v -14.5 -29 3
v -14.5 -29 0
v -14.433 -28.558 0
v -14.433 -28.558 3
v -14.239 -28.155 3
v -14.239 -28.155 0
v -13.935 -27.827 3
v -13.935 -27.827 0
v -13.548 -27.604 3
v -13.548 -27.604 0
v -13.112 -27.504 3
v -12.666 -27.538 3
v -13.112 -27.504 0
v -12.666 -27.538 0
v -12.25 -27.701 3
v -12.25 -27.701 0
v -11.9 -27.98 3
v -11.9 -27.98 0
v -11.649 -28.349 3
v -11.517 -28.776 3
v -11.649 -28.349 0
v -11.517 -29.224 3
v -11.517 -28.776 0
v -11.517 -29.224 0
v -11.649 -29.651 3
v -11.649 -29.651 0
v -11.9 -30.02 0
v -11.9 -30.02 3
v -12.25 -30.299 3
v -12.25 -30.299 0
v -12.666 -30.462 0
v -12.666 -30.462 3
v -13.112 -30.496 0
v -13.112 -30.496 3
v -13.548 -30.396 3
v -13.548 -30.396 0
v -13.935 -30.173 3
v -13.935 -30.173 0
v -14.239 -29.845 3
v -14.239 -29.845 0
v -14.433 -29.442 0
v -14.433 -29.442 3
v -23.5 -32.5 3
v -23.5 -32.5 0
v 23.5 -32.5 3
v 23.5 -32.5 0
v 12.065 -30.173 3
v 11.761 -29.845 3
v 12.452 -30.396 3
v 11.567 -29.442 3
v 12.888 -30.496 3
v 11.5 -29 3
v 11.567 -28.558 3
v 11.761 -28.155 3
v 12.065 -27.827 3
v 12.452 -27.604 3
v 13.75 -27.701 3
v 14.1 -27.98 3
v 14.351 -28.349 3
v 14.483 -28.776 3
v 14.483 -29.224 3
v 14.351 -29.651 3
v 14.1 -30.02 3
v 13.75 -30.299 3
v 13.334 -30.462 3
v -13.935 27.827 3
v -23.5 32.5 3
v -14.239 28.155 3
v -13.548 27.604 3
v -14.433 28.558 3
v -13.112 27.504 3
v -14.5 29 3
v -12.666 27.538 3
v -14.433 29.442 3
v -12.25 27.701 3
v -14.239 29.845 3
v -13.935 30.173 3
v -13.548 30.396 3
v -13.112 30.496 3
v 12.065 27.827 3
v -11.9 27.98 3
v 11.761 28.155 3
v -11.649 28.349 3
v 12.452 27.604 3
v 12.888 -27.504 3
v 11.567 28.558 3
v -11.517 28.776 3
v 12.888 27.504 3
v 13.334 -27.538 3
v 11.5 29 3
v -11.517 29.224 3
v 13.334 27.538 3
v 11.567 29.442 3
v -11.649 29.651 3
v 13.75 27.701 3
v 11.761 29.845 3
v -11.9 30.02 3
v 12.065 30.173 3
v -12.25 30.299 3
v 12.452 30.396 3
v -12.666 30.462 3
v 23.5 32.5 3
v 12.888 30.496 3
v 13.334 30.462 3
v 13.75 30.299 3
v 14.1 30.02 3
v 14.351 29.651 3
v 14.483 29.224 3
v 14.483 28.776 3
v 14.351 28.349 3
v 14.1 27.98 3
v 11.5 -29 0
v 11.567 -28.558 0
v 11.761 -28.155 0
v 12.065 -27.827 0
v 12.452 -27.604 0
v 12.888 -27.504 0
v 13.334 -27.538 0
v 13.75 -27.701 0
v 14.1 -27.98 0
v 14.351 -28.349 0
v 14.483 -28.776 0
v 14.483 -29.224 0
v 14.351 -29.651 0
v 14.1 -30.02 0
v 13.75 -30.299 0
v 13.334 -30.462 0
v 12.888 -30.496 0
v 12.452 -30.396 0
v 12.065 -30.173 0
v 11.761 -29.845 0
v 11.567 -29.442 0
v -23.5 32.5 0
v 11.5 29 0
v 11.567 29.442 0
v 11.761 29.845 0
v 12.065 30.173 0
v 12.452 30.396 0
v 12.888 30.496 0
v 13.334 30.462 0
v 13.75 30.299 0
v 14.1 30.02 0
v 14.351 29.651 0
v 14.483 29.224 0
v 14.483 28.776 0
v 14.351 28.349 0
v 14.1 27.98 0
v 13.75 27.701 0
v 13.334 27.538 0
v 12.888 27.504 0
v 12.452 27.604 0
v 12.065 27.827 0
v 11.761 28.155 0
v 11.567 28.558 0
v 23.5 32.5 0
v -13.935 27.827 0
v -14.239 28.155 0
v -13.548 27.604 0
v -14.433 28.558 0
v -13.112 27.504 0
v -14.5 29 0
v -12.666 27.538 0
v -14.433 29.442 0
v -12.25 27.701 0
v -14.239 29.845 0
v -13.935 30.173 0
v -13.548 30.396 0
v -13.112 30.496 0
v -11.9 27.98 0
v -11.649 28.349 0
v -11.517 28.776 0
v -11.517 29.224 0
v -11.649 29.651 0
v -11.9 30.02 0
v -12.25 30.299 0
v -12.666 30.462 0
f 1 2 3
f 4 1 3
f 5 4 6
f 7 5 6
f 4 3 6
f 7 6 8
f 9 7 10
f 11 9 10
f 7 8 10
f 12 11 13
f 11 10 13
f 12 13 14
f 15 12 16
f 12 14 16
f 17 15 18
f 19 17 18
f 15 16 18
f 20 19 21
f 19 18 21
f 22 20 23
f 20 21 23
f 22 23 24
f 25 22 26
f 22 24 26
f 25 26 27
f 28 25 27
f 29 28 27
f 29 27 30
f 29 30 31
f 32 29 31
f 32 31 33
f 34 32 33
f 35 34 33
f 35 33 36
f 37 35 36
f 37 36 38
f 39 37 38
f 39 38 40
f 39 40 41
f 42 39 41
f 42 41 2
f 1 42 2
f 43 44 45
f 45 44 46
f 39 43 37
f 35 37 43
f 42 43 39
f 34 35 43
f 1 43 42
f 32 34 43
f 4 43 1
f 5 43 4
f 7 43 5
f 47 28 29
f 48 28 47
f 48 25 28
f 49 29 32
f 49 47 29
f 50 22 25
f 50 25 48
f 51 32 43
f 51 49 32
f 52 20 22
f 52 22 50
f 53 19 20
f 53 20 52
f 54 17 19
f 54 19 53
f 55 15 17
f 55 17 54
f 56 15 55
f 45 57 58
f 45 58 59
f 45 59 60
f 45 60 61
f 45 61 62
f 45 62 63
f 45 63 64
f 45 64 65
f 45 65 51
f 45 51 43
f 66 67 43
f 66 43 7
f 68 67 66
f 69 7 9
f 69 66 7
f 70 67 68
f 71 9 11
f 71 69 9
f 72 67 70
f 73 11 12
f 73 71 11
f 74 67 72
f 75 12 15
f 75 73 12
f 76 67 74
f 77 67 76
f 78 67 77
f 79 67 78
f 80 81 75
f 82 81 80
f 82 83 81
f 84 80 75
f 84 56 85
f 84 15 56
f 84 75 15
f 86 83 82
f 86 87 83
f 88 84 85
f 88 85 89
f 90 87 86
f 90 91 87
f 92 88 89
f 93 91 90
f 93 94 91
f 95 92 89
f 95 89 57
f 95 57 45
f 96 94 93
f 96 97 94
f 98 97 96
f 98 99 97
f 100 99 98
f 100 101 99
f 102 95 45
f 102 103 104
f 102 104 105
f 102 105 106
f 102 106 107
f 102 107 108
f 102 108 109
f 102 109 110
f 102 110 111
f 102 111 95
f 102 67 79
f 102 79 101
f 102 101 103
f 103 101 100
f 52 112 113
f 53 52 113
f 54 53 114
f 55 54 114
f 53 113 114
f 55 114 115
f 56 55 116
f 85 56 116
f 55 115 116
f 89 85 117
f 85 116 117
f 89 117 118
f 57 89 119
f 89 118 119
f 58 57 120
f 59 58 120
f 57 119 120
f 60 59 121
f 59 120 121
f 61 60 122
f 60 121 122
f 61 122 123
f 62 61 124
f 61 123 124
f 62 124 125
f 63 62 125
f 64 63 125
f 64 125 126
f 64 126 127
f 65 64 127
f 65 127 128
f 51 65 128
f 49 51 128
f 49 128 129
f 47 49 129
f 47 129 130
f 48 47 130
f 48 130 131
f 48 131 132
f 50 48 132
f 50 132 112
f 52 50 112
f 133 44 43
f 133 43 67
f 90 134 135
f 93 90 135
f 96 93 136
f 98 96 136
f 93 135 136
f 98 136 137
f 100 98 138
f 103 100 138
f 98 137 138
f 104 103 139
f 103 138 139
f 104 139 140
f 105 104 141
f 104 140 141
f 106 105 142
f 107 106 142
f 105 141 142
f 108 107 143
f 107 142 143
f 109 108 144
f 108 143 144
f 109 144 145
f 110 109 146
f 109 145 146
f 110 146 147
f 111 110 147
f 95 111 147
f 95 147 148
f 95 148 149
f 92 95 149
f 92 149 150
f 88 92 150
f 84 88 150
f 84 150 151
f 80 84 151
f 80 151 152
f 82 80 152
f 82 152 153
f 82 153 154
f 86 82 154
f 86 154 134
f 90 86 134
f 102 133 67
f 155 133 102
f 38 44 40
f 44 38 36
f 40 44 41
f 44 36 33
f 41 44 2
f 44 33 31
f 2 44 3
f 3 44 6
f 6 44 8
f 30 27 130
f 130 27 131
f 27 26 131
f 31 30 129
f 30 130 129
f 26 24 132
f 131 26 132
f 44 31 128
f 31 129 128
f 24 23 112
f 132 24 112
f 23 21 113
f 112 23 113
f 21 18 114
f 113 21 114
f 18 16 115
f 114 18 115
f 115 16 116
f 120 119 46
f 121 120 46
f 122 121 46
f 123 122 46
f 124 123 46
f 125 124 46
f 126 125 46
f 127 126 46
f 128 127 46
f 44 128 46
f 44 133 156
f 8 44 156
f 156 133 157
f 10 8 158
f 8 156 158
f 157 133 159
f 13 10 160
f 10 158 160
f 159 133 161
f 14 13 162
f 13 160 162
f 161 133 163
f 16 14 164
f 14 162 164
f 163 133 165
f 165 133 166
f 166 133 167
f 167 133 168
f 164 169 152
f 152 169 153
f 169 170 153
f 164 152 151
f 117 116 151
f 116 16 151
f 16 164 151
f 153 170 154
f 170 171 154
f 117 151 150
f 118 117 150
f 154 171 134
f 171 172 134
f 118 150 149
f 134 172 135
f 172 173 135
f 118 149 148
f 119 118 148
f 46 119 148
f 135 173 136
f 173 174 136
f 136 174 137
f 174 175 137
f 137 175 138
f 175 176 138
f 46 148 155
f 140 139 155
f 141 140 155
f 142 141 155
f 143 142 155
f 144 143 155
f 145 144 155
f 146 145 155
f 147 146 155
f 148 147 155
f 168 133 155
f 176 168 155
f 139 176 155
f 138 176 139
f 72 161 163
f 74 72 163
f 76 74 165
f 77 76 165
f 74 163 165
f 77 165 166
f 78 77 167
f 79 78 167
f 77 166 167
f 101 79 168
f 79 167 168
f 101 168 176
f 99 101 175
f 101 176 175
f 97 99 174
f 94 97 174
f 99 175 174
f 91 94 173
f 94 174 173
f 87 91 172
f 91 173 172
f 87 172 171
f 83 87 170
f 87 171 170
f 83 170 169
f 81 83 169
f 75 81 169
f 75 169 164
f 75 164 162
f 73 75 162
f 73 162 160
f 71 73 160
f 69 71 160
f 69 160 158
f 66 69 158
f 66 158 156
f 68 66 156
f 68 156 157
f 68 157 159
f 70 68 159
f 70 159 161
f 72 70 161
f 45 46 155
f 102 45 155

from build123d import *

# Parameters (mm, degrees)
SKETCH1_W                 = 47
SKETCH1_H                 = 65
BOSS_EXTRUDE1_DEPTH       = 3
F_3_0MM_DOWEL_HOLE1_D     = 3
F_3_0MM_DOWEL_HOLE1_DEPTH = 4
F_3_0MM_DOWEL_HOLE1_TIP   = 0.901290929


with BuildPart() as part:
    # Sketch1 → Boss-Extrude1 (new body)
    with BuildSketch(Plane.XY):
        Rectangle(SKETCH1_W, SKETCH1_H)
    extrude(amount=BOSS_EXTRUDE1_DEPTH)

    # Ø3.0mm Dowel Hole1
    with Locations(Plane.XY.offset(3)):
        with Locations((-13, -29), (13, -29), (13, 29), (-13, 29)):
            Hole(F_3_0MM_DOWEL_HOLE1_D / 2, depth=F_3_0MM_DOWEL_HOLE1_DEPTH)
            with Locations((0, 0, -(F_3_0MM_DOWEL_HOLE1_DEPTH + F_3_0MM_DOWEL_HOLE1_TIP / 2))):  # 118° drill point
                Cone(0, F_3_0MM_DOWEL_HOLE1_D / 2, F_3_0MM_DOWEL_HOLE1_TIP, mode=Mode.SUBTRACT)


solid = part.part
